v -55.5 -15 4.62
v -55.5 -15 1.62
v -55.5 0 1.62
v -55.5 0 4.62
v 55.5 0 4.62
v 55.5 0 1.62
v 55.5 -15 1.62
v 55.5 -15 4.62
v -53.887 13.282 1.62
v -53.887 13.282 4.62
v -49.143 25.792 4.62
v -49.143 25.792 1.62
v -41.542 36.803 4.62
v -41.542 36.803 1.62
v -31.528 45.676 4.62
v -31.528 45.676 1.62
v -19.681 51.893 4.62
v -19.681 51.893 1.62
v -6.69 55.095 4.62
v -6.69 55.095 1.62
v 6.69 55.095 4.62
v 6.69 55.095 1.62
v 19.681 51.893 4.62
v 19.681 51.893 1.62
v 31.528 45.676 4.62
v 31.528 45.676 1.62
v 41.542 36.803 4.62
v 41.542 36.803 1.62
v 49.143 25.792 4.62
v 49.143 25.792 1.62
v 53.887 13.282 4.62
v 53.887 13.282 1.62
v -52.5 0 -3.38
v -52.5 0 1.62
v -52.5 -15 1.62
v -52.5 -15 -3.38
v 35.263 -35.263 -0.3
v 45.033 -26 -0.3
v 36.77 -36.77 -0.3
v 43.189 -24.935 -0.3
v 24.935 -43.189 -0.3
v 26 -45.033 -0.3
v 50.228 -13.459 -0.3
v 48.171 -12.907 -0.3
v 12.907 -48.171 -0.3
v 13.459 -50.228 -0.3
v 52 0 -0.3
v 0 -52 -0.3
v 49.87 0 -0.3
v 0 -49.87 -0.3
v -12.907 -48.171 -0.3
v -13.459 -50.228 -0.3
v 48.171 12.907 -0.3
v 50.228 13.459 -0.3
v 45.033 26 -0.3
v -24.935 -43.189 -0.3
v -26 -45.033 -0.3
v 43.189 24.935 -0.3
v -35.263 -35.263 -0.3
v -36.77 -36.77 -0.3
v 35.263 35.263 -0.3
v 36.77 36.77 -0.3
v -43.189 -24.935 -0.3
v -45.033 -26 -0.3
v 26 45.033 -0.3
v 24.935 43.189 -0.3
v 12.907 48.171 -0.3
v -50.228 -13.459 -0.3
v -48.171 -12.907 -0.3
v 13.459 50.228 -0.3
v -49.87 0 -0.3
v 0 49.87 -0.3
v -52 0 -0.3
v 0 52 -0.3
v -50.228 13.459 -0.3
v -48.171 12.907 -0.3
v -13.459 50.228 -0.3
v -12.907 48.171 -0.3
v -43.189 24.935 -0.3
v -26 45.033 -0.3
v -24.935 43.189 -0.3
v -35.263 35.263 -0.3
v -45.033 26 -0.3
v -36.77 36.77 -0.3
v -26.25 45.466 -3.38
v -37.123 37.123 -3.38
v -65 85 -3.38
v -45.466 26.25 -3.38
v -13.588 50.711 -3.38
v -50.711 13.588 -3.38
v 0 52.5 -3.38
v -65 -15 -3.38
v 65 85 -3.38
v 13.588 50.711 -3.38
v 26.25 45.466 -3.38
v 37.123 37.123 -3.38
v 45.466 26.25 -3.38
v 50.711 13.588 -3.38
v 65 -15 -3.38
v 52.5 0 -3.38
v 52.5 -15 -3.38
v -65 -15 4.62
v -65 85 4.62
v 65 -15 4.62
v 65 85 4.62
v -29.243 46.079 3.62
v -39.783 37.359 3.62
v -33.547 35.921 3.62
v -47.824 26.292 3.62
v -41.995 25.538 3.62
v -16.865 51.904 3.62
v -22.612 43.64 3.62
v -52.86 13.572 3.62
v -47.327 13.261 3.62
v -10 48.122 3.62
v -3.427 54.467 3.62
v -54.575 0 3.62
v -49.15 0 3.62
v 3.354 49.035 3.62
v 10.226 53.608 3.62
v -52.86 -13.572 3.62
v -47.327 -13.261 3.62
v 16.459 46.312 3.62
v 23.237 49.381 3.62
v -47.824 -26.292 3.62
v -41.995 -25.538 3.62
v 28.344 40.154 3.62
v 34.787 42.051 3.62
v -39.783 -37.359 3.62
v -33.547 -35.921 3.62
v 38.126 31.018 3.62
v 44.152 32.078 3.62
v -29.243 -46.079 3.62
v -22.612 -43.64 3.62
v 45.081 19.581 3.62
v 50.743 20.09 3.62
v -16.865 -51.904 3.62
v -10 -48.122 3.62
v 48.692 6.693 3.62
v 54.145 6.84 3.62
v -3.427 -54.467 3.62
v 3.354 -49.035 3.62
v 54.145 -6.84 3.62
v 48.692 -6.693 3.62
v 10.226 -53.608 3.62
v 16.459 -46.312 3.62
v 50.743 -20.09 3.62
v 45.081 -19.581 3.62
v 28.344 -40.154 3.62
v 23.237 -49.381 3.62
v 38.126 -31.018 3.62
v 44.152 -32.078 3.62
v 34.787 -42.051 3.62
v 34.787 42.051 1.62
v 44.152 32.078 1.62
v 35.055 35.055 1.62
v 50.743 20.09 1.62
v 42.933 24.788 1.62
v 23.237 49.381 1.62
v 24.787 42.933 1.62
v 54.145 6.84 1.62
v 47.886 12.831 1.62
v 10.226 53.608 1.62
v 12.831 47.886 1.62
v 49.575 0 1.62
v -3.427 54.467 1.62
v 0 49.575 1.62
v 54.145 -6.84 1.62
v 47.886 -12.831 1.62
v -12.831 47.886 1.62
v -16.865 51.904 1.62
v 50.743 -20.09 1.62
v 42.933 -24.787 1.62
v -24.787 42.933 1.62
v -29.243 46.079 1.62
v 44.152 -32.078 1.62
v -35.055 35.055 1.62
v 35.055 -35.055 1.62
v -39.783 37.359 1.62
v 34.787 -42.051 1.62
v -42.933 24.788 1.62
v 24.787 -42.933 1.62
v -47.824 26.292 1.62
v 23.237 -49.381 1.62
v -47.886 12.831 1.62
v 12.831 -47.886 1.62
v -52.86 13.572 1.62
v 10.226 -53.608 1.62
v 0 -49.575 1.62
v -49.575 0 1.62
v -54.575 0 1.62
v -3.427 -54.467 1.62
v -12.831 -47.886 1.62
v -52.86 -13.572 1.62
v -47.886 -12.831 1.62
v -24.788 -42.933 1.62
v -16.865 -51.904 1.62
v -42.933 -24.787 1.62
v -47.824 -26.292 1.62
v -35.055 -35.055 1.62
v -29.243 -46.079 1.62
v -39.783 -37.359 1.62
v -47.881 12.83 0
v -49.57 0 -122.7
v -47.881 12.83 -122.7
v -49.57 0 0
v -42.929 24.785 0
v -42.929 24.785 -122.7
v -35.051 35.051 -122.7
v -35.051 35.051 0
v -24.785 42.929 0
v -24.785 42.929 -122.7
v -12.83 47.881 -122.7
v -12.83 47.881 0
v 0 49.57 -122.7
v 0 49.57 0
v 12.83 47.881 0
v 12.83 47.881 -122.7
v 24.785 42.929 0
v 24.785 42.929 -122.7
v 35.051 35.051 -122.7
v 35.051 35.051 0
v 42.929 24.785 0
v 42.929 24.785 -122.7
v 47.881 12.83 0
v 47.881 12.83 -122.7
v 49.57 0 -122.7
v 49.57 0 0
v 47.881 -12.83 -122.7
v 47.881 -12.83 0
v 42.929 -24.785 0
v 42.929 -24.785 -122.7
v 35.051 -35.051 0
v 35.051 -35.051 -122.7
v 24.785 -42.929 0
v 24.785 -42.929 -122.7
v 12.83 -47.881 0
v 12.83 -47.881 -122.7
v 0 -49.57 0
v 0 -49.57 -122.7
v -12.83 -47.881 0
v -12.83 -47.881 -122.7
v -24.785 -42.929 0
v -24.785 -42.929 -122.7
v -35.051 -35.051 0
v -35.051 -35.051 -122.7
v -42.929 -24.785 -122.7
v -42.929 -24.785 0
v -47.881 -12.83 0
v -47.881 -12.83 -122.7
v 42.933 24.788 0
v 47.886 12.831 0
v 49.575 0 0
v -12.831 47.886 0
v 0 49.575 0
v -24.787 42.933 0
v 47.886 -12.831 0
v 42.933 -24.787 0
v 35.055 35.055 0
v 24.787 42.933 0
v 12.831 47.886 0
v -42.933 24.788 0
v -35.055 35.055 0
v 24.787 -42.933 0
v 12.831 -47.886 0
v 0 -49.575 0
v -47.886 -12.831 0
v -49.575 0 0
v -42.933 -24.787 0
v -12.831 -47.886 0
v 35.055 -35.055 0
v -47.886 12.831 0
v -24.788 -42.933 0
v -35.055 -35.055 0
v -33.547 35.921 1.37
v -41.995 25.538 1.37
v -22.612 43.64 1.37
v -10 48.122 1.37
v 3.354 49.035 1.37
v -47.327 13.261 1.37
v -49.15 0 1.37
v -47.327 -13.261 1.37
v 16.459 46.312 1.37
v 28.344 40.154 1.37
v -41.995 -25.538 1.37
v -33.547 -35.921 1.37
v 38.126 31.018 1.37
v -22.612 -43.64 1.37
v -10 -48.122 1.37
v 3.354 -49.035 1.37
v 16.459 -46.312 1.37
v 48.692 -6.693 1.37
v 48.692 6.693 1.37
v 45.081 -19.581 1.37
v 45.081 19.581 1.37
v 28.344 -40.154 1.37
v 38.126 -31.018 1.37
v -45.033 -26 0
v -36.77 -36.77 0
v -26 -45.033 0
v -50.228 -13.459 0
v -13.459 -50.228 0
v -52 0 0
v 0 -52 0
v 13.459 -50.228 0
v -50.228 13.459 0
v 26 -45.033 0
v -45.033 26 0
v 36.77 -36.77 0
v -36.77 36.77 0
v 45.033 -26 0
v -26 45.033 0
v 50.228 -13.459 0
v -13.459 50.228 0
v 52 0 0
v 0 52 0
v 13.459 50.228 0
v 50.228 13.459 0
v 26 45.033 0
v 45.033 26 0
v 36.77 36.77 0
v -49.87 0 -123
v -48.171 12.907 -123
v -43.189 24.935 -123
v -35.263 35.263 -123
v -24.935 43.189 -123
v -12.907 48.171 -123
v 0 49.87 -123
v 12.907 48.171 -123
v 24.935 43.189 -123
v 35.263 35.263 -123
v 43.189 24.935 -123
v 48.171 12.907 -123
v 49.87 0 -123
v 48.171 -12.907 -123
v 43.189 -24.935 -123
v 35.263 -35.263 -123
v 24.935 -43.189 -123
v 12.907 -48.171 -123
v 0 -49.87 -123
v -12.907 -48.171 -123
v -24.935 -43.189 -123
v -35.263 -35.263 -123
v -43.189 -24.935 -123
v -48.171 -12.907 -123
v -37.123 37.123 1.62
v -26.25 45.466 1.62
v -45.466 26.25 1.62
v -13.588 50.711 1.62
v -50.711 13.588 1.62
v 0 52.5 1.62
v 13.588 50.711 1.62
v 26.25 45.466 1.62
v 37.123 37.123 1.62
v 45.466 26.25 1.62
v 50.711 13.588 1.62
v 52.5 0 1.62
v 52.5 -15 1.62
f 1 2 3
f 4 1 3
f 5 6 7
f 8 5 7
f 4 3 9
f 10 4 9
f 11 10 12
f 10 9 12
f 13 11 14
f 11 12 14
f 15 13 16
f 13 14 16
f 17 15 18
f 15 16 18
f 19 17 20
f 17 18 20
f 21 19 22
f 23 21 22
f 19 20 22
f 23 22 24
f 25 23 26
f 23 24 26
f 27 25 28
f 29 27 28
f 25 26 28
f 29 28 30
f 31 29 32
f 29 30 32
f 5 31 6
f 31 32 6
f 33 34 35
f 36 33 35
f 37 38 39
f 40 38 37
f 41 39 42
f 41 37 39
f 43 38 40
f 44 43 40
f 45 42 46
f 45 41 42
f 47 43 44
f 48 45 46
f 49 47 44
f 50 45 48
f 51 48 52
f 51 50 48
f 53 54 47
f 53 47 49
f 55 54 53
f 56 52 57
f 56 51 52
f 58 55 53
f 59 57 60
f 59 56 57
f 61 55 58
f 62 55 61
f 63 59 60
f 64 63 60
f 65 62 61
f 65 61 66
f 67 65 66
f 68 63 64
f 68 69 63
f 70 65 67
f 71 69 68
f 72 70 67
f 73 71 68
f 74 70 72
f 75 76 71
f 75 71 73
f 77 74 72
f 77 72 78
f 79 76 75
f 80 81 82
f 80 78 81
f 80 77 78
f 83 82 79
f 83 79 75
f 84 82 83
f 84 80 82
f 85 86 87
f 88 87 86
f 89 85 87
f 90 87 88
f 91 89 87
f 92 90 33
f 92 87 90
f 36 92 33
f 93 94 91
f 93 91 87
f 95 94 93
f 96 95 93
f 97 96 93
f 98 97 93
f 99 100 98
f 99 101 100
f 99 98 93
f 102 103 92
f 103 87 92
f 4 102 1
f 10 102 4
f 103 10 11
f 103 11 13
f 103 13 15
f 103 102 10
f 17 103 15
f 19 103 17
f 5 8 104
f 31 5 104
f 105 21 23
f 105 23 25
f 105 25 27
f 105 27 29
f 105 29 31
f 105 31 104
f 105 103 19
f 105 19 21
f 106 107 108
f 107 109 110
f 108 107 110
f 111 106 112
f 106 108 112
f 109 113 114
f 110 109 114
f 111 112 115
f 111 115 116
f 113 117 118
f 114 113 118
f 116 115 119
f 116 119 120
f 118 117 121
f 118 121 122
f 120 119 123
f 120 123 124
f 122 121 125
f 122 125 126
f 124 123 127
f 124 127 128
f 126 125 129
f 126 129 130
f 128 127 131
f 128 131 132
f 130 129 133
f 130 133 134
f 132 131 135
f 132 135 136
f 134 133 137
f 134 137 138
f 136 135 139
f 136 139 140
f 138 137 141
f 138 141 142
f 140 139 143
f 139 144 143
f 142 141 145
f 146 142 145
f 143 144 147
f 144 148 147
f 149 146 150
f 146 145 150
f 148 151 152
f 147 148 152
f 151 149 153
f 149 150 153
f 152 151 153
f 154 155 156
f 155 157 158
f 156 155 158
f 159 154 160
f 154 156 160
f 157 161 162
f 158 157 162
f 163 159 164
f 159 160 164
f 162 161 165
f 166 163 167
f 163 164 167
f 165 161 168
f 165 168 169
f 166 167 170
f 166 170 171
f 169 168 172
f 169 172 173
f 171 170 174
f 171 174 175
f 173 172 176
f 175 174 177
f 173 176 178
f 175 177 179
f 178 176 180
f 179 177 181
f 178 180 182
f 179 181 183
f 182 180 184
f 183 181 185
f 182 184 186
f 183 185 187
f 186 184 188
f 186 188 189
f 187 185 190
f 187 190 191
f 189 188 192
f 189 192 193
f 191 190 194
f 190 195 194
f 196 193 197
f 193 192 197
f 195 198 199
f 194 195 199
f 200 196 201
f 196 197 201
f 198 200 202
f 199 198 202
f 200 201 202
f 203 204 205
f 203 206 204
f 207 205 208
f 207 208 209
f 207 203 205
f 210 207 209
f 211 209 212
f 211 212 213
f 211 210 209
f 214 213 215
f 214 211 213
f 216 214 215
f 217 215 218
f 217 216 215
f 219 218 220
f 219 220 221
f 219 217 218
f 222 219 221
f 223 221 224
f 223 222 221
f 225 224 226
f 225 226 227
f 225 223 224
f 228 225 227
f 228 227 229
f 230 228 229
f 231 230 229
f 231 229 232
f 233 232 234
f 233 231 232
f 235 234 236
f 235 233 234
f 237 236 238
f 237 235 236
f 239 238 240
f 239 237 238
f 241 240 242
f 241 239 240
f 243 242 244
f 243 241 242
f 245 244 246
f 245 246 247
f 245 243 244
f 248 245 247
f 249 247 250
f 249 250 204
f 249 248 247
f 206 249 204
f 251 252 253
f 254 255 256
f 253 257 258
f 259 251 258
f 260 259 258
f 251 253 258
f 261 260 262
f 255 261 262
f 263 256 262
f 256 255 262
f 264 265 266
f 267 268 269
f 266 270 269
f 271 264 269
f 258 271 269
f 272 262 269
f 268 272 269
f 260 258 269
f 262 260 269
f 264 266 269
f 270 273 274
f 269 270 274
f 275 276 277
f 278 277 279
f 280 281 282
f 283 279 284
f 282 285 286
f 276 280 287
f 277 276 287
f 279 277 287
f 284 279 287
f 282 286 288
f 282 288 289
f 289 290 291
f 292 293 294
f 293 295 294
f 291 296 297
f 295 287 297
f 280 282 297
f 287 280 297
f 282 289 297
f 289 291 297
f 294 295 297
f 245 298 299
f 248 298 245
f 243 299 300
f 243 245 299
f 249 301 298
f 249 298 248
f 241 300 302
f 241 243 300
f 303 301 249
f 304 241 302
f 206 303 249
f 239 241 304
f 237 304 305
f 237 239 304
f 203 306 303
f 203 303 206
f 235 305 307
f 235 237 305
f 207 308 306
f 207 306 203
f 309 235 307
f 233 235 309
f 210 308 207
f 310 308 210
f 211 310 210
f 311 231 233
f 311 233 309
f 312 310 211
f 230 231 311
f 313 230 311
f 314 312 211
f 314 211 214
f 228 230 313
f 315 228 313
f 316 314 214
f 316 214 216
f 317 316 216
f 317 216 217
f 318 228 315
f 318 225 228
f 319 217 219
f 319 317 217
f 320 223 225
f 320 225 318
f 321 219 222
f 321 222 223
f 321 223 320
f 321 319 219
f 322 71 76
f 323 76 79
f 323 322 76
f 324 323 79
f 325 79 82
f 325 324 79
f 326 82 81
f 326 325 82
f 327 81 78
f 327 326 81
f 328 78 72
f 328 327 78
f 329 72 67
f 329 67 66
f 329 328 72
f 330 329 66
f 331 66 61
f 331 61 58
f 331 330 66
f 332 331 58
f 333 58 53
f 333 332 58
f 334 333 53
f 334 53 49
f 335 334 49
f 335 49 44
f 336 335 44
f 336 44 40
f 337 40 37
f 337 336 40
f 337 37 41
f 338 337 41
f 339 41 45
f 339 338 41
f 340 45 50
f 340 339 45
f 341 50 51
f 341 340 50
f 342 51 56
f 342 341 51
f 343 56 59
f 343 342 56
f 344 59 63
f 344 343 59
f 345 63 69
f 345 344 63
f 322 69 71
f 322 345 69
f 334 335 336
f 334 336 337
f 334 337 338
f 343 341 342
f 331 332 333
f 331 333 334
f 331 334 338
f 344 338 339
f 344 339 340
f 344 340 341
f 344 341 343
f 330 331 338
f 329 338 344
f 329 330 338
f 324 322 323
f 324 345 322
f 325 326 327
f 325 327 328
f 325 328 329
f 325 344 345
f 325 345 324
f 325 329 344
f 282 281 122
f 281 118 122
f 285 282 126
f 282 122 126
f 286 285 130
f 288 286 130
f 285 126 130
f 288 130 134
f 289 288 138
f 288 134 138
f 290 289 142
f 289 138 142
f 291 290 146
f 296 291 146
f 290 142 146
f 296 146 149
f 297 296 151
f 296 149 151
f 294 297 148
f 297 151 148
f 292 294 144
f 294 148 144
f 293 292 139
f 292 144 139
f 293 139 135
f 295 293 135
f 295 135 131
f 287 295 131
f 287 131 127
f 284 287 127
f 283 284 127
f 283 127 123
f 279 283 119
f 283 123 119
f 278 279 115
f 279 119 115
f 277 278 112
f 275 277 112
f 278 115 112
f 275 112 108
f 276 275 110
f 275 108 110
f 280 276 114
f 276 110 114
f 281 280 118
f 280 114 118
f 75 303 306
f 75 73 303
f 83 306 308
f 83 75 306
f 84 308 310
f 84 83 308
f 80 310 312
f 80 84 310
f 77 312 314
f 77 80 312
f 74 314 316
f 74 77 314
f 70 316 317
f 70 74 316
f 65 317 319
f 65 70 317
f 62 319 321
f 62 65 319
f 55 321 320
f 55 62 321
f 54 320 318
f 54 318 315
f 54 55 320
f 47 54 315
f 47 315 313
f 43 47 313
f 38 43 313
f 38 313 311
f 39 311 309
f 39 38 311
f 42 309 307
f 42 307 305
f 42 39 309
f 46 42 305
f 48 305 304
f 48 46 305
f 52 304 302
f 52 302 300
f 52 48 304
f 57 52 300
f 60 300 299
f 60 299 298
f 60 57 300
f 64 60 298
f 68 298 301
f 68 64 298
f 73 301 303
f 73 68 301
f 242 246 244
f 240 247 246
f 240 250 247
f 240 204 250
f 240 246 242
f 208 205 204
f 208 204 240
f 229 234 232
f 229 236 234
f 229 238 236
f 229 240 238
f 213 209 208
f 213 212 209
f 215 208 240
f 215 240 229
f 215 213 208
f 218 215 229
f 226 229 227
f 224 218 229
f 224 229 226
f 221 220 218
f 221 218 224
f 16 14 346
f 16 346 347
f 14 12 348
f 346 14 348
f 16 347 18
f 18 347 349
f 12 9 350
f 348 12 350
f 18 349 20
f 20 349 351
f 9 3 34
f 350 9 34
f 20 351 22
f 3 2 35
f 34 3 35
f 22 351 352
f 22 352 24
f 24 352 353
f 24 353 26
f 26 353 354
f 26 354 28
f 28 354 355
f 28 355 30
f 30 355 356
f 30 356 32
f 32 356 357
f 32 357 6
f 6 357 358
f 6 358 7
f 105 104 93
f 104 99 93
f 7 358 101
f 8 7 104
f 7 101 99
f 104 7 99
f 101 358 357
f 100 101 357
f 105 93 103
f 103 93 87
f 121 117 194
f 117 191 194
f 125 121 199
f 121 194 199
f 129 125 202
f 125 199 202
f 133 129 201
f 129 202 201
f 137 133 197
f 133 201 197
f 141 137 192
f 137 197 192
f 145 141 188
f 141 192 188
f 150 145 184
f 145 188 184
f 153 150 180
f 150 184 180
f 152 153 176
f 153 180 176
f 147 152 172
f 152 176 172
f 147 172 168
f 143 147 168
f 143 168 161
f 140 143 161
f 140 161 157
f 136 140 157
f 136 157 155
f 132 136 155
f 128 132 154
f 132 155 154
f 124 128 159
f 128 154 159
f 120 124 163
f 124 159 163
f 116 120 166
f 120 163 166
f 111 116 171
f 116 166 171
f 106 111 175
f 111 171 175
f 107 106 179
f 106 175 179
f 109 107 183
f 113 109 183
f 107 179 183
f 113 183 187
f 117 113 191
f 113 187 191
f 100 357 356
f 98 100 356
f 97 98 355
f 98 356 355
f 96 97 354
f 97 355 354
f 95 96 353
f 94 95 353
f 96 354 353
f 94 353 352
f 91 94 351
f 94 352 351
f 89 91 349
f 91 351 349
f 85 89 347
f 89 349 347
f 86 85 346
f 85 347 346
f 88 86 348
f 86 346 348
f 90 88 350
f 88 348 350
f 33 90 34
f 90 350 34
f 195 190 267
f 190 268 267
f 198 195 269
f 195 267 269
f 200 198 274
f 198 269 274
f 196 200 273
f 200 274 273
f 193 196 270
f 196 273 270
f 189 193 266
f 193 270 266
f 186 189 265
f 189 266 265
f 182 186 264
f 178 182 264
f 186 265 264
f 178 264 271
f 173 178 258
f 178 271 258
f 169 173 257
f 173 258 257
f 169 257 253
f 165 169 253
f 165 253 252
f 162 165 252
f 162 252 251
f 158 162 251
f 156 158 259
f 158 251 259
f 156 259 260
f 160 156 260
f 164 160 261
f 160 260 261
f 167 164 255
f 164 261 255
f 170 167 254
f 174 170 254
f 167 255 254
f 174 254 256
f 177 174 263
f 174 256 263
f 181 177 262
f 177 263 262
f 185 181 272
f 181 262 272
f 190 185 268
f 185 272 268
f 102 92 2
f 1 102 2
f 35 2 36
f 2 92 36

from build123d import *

# Parameters (mm, degrees)
F5_DEPTH = 5
F7_DEPTH = 3


with BuildPart() as f1:
    # F0 (on Front) → F1 (revolve)
    with BuildSketch(Plane.XZ):
        Polygon((-49.575, 0), (0, 0), (0, 1.37), (-49.15, 1.37), (-49.15, 3.62), (-54.575, 3.62), (-54.575, 1.62), (-49.575, 1.62), align=None)
    revolve(axis=Axis((0, 0, 25.178327), (0, 0, 1)))


with BuildPart() as f3:
    # F2 (on Front) → F3 (revolve)
    with BuildSketch(Plane.XZ):
        Polygon((-49.87, -123), (0, -123), (0, -122.7), (-49.57, -122.7), (-49.57, 0), (-52, 0), (-52, -0.3), (-49.87, -0.3), align=None)
    revolve(axis=Axis((0, 0, -61.5), (0, 0, -1)))


with BuildPart() as f5:
    # F4 (on face) → F5 (new body)
    with BuildSketch(Plane(origin=(0, 0, 1.62), x_dir=(1, 0, 0), z_dir=(0, 0, -1))):
        with BuildLine():
            ThreePointArc((52.5, 0), (0, -52.5), (-52.5, 0))
            Line((-52.5, 0), (-52.5, 15))
            Line((-52.5, 15), (-65, 15))
            Line((-65, 15), (-65, -85))
            Line((-65, -85), (65, -85))
            Line((65, -85), (65, 15))
            Line((65, 15), (52.5, 15))
            Line((52.5, 15), (52.5, 0))
        make_face()
    extrude(amount=F5_DEPTH)

    # F6 (on face) → F7 (join)
    with BuildSketch(Plane.XY.offset(1.62)):
        with BuildLine():
            ThreePointArc((-55.5, 0), (0, 55.5), (55.5, 0))
            Line((55.5, 0), (55.5, -15))
            Line((55.5, -15), (65, -15))
            Line((65, -15), (65, 85))
            Line((65, 85), (-65, 85))
            Line((-65, 85), (-65, -15))
            Line((-65, -15), (-55.5, -15))
            Line((-55.5, -15), (-55.5, 0))
        make_face()
    extrude(amount=F7_DEPTH)


solid = Compound([f1.part, f3.part, f5.part])
